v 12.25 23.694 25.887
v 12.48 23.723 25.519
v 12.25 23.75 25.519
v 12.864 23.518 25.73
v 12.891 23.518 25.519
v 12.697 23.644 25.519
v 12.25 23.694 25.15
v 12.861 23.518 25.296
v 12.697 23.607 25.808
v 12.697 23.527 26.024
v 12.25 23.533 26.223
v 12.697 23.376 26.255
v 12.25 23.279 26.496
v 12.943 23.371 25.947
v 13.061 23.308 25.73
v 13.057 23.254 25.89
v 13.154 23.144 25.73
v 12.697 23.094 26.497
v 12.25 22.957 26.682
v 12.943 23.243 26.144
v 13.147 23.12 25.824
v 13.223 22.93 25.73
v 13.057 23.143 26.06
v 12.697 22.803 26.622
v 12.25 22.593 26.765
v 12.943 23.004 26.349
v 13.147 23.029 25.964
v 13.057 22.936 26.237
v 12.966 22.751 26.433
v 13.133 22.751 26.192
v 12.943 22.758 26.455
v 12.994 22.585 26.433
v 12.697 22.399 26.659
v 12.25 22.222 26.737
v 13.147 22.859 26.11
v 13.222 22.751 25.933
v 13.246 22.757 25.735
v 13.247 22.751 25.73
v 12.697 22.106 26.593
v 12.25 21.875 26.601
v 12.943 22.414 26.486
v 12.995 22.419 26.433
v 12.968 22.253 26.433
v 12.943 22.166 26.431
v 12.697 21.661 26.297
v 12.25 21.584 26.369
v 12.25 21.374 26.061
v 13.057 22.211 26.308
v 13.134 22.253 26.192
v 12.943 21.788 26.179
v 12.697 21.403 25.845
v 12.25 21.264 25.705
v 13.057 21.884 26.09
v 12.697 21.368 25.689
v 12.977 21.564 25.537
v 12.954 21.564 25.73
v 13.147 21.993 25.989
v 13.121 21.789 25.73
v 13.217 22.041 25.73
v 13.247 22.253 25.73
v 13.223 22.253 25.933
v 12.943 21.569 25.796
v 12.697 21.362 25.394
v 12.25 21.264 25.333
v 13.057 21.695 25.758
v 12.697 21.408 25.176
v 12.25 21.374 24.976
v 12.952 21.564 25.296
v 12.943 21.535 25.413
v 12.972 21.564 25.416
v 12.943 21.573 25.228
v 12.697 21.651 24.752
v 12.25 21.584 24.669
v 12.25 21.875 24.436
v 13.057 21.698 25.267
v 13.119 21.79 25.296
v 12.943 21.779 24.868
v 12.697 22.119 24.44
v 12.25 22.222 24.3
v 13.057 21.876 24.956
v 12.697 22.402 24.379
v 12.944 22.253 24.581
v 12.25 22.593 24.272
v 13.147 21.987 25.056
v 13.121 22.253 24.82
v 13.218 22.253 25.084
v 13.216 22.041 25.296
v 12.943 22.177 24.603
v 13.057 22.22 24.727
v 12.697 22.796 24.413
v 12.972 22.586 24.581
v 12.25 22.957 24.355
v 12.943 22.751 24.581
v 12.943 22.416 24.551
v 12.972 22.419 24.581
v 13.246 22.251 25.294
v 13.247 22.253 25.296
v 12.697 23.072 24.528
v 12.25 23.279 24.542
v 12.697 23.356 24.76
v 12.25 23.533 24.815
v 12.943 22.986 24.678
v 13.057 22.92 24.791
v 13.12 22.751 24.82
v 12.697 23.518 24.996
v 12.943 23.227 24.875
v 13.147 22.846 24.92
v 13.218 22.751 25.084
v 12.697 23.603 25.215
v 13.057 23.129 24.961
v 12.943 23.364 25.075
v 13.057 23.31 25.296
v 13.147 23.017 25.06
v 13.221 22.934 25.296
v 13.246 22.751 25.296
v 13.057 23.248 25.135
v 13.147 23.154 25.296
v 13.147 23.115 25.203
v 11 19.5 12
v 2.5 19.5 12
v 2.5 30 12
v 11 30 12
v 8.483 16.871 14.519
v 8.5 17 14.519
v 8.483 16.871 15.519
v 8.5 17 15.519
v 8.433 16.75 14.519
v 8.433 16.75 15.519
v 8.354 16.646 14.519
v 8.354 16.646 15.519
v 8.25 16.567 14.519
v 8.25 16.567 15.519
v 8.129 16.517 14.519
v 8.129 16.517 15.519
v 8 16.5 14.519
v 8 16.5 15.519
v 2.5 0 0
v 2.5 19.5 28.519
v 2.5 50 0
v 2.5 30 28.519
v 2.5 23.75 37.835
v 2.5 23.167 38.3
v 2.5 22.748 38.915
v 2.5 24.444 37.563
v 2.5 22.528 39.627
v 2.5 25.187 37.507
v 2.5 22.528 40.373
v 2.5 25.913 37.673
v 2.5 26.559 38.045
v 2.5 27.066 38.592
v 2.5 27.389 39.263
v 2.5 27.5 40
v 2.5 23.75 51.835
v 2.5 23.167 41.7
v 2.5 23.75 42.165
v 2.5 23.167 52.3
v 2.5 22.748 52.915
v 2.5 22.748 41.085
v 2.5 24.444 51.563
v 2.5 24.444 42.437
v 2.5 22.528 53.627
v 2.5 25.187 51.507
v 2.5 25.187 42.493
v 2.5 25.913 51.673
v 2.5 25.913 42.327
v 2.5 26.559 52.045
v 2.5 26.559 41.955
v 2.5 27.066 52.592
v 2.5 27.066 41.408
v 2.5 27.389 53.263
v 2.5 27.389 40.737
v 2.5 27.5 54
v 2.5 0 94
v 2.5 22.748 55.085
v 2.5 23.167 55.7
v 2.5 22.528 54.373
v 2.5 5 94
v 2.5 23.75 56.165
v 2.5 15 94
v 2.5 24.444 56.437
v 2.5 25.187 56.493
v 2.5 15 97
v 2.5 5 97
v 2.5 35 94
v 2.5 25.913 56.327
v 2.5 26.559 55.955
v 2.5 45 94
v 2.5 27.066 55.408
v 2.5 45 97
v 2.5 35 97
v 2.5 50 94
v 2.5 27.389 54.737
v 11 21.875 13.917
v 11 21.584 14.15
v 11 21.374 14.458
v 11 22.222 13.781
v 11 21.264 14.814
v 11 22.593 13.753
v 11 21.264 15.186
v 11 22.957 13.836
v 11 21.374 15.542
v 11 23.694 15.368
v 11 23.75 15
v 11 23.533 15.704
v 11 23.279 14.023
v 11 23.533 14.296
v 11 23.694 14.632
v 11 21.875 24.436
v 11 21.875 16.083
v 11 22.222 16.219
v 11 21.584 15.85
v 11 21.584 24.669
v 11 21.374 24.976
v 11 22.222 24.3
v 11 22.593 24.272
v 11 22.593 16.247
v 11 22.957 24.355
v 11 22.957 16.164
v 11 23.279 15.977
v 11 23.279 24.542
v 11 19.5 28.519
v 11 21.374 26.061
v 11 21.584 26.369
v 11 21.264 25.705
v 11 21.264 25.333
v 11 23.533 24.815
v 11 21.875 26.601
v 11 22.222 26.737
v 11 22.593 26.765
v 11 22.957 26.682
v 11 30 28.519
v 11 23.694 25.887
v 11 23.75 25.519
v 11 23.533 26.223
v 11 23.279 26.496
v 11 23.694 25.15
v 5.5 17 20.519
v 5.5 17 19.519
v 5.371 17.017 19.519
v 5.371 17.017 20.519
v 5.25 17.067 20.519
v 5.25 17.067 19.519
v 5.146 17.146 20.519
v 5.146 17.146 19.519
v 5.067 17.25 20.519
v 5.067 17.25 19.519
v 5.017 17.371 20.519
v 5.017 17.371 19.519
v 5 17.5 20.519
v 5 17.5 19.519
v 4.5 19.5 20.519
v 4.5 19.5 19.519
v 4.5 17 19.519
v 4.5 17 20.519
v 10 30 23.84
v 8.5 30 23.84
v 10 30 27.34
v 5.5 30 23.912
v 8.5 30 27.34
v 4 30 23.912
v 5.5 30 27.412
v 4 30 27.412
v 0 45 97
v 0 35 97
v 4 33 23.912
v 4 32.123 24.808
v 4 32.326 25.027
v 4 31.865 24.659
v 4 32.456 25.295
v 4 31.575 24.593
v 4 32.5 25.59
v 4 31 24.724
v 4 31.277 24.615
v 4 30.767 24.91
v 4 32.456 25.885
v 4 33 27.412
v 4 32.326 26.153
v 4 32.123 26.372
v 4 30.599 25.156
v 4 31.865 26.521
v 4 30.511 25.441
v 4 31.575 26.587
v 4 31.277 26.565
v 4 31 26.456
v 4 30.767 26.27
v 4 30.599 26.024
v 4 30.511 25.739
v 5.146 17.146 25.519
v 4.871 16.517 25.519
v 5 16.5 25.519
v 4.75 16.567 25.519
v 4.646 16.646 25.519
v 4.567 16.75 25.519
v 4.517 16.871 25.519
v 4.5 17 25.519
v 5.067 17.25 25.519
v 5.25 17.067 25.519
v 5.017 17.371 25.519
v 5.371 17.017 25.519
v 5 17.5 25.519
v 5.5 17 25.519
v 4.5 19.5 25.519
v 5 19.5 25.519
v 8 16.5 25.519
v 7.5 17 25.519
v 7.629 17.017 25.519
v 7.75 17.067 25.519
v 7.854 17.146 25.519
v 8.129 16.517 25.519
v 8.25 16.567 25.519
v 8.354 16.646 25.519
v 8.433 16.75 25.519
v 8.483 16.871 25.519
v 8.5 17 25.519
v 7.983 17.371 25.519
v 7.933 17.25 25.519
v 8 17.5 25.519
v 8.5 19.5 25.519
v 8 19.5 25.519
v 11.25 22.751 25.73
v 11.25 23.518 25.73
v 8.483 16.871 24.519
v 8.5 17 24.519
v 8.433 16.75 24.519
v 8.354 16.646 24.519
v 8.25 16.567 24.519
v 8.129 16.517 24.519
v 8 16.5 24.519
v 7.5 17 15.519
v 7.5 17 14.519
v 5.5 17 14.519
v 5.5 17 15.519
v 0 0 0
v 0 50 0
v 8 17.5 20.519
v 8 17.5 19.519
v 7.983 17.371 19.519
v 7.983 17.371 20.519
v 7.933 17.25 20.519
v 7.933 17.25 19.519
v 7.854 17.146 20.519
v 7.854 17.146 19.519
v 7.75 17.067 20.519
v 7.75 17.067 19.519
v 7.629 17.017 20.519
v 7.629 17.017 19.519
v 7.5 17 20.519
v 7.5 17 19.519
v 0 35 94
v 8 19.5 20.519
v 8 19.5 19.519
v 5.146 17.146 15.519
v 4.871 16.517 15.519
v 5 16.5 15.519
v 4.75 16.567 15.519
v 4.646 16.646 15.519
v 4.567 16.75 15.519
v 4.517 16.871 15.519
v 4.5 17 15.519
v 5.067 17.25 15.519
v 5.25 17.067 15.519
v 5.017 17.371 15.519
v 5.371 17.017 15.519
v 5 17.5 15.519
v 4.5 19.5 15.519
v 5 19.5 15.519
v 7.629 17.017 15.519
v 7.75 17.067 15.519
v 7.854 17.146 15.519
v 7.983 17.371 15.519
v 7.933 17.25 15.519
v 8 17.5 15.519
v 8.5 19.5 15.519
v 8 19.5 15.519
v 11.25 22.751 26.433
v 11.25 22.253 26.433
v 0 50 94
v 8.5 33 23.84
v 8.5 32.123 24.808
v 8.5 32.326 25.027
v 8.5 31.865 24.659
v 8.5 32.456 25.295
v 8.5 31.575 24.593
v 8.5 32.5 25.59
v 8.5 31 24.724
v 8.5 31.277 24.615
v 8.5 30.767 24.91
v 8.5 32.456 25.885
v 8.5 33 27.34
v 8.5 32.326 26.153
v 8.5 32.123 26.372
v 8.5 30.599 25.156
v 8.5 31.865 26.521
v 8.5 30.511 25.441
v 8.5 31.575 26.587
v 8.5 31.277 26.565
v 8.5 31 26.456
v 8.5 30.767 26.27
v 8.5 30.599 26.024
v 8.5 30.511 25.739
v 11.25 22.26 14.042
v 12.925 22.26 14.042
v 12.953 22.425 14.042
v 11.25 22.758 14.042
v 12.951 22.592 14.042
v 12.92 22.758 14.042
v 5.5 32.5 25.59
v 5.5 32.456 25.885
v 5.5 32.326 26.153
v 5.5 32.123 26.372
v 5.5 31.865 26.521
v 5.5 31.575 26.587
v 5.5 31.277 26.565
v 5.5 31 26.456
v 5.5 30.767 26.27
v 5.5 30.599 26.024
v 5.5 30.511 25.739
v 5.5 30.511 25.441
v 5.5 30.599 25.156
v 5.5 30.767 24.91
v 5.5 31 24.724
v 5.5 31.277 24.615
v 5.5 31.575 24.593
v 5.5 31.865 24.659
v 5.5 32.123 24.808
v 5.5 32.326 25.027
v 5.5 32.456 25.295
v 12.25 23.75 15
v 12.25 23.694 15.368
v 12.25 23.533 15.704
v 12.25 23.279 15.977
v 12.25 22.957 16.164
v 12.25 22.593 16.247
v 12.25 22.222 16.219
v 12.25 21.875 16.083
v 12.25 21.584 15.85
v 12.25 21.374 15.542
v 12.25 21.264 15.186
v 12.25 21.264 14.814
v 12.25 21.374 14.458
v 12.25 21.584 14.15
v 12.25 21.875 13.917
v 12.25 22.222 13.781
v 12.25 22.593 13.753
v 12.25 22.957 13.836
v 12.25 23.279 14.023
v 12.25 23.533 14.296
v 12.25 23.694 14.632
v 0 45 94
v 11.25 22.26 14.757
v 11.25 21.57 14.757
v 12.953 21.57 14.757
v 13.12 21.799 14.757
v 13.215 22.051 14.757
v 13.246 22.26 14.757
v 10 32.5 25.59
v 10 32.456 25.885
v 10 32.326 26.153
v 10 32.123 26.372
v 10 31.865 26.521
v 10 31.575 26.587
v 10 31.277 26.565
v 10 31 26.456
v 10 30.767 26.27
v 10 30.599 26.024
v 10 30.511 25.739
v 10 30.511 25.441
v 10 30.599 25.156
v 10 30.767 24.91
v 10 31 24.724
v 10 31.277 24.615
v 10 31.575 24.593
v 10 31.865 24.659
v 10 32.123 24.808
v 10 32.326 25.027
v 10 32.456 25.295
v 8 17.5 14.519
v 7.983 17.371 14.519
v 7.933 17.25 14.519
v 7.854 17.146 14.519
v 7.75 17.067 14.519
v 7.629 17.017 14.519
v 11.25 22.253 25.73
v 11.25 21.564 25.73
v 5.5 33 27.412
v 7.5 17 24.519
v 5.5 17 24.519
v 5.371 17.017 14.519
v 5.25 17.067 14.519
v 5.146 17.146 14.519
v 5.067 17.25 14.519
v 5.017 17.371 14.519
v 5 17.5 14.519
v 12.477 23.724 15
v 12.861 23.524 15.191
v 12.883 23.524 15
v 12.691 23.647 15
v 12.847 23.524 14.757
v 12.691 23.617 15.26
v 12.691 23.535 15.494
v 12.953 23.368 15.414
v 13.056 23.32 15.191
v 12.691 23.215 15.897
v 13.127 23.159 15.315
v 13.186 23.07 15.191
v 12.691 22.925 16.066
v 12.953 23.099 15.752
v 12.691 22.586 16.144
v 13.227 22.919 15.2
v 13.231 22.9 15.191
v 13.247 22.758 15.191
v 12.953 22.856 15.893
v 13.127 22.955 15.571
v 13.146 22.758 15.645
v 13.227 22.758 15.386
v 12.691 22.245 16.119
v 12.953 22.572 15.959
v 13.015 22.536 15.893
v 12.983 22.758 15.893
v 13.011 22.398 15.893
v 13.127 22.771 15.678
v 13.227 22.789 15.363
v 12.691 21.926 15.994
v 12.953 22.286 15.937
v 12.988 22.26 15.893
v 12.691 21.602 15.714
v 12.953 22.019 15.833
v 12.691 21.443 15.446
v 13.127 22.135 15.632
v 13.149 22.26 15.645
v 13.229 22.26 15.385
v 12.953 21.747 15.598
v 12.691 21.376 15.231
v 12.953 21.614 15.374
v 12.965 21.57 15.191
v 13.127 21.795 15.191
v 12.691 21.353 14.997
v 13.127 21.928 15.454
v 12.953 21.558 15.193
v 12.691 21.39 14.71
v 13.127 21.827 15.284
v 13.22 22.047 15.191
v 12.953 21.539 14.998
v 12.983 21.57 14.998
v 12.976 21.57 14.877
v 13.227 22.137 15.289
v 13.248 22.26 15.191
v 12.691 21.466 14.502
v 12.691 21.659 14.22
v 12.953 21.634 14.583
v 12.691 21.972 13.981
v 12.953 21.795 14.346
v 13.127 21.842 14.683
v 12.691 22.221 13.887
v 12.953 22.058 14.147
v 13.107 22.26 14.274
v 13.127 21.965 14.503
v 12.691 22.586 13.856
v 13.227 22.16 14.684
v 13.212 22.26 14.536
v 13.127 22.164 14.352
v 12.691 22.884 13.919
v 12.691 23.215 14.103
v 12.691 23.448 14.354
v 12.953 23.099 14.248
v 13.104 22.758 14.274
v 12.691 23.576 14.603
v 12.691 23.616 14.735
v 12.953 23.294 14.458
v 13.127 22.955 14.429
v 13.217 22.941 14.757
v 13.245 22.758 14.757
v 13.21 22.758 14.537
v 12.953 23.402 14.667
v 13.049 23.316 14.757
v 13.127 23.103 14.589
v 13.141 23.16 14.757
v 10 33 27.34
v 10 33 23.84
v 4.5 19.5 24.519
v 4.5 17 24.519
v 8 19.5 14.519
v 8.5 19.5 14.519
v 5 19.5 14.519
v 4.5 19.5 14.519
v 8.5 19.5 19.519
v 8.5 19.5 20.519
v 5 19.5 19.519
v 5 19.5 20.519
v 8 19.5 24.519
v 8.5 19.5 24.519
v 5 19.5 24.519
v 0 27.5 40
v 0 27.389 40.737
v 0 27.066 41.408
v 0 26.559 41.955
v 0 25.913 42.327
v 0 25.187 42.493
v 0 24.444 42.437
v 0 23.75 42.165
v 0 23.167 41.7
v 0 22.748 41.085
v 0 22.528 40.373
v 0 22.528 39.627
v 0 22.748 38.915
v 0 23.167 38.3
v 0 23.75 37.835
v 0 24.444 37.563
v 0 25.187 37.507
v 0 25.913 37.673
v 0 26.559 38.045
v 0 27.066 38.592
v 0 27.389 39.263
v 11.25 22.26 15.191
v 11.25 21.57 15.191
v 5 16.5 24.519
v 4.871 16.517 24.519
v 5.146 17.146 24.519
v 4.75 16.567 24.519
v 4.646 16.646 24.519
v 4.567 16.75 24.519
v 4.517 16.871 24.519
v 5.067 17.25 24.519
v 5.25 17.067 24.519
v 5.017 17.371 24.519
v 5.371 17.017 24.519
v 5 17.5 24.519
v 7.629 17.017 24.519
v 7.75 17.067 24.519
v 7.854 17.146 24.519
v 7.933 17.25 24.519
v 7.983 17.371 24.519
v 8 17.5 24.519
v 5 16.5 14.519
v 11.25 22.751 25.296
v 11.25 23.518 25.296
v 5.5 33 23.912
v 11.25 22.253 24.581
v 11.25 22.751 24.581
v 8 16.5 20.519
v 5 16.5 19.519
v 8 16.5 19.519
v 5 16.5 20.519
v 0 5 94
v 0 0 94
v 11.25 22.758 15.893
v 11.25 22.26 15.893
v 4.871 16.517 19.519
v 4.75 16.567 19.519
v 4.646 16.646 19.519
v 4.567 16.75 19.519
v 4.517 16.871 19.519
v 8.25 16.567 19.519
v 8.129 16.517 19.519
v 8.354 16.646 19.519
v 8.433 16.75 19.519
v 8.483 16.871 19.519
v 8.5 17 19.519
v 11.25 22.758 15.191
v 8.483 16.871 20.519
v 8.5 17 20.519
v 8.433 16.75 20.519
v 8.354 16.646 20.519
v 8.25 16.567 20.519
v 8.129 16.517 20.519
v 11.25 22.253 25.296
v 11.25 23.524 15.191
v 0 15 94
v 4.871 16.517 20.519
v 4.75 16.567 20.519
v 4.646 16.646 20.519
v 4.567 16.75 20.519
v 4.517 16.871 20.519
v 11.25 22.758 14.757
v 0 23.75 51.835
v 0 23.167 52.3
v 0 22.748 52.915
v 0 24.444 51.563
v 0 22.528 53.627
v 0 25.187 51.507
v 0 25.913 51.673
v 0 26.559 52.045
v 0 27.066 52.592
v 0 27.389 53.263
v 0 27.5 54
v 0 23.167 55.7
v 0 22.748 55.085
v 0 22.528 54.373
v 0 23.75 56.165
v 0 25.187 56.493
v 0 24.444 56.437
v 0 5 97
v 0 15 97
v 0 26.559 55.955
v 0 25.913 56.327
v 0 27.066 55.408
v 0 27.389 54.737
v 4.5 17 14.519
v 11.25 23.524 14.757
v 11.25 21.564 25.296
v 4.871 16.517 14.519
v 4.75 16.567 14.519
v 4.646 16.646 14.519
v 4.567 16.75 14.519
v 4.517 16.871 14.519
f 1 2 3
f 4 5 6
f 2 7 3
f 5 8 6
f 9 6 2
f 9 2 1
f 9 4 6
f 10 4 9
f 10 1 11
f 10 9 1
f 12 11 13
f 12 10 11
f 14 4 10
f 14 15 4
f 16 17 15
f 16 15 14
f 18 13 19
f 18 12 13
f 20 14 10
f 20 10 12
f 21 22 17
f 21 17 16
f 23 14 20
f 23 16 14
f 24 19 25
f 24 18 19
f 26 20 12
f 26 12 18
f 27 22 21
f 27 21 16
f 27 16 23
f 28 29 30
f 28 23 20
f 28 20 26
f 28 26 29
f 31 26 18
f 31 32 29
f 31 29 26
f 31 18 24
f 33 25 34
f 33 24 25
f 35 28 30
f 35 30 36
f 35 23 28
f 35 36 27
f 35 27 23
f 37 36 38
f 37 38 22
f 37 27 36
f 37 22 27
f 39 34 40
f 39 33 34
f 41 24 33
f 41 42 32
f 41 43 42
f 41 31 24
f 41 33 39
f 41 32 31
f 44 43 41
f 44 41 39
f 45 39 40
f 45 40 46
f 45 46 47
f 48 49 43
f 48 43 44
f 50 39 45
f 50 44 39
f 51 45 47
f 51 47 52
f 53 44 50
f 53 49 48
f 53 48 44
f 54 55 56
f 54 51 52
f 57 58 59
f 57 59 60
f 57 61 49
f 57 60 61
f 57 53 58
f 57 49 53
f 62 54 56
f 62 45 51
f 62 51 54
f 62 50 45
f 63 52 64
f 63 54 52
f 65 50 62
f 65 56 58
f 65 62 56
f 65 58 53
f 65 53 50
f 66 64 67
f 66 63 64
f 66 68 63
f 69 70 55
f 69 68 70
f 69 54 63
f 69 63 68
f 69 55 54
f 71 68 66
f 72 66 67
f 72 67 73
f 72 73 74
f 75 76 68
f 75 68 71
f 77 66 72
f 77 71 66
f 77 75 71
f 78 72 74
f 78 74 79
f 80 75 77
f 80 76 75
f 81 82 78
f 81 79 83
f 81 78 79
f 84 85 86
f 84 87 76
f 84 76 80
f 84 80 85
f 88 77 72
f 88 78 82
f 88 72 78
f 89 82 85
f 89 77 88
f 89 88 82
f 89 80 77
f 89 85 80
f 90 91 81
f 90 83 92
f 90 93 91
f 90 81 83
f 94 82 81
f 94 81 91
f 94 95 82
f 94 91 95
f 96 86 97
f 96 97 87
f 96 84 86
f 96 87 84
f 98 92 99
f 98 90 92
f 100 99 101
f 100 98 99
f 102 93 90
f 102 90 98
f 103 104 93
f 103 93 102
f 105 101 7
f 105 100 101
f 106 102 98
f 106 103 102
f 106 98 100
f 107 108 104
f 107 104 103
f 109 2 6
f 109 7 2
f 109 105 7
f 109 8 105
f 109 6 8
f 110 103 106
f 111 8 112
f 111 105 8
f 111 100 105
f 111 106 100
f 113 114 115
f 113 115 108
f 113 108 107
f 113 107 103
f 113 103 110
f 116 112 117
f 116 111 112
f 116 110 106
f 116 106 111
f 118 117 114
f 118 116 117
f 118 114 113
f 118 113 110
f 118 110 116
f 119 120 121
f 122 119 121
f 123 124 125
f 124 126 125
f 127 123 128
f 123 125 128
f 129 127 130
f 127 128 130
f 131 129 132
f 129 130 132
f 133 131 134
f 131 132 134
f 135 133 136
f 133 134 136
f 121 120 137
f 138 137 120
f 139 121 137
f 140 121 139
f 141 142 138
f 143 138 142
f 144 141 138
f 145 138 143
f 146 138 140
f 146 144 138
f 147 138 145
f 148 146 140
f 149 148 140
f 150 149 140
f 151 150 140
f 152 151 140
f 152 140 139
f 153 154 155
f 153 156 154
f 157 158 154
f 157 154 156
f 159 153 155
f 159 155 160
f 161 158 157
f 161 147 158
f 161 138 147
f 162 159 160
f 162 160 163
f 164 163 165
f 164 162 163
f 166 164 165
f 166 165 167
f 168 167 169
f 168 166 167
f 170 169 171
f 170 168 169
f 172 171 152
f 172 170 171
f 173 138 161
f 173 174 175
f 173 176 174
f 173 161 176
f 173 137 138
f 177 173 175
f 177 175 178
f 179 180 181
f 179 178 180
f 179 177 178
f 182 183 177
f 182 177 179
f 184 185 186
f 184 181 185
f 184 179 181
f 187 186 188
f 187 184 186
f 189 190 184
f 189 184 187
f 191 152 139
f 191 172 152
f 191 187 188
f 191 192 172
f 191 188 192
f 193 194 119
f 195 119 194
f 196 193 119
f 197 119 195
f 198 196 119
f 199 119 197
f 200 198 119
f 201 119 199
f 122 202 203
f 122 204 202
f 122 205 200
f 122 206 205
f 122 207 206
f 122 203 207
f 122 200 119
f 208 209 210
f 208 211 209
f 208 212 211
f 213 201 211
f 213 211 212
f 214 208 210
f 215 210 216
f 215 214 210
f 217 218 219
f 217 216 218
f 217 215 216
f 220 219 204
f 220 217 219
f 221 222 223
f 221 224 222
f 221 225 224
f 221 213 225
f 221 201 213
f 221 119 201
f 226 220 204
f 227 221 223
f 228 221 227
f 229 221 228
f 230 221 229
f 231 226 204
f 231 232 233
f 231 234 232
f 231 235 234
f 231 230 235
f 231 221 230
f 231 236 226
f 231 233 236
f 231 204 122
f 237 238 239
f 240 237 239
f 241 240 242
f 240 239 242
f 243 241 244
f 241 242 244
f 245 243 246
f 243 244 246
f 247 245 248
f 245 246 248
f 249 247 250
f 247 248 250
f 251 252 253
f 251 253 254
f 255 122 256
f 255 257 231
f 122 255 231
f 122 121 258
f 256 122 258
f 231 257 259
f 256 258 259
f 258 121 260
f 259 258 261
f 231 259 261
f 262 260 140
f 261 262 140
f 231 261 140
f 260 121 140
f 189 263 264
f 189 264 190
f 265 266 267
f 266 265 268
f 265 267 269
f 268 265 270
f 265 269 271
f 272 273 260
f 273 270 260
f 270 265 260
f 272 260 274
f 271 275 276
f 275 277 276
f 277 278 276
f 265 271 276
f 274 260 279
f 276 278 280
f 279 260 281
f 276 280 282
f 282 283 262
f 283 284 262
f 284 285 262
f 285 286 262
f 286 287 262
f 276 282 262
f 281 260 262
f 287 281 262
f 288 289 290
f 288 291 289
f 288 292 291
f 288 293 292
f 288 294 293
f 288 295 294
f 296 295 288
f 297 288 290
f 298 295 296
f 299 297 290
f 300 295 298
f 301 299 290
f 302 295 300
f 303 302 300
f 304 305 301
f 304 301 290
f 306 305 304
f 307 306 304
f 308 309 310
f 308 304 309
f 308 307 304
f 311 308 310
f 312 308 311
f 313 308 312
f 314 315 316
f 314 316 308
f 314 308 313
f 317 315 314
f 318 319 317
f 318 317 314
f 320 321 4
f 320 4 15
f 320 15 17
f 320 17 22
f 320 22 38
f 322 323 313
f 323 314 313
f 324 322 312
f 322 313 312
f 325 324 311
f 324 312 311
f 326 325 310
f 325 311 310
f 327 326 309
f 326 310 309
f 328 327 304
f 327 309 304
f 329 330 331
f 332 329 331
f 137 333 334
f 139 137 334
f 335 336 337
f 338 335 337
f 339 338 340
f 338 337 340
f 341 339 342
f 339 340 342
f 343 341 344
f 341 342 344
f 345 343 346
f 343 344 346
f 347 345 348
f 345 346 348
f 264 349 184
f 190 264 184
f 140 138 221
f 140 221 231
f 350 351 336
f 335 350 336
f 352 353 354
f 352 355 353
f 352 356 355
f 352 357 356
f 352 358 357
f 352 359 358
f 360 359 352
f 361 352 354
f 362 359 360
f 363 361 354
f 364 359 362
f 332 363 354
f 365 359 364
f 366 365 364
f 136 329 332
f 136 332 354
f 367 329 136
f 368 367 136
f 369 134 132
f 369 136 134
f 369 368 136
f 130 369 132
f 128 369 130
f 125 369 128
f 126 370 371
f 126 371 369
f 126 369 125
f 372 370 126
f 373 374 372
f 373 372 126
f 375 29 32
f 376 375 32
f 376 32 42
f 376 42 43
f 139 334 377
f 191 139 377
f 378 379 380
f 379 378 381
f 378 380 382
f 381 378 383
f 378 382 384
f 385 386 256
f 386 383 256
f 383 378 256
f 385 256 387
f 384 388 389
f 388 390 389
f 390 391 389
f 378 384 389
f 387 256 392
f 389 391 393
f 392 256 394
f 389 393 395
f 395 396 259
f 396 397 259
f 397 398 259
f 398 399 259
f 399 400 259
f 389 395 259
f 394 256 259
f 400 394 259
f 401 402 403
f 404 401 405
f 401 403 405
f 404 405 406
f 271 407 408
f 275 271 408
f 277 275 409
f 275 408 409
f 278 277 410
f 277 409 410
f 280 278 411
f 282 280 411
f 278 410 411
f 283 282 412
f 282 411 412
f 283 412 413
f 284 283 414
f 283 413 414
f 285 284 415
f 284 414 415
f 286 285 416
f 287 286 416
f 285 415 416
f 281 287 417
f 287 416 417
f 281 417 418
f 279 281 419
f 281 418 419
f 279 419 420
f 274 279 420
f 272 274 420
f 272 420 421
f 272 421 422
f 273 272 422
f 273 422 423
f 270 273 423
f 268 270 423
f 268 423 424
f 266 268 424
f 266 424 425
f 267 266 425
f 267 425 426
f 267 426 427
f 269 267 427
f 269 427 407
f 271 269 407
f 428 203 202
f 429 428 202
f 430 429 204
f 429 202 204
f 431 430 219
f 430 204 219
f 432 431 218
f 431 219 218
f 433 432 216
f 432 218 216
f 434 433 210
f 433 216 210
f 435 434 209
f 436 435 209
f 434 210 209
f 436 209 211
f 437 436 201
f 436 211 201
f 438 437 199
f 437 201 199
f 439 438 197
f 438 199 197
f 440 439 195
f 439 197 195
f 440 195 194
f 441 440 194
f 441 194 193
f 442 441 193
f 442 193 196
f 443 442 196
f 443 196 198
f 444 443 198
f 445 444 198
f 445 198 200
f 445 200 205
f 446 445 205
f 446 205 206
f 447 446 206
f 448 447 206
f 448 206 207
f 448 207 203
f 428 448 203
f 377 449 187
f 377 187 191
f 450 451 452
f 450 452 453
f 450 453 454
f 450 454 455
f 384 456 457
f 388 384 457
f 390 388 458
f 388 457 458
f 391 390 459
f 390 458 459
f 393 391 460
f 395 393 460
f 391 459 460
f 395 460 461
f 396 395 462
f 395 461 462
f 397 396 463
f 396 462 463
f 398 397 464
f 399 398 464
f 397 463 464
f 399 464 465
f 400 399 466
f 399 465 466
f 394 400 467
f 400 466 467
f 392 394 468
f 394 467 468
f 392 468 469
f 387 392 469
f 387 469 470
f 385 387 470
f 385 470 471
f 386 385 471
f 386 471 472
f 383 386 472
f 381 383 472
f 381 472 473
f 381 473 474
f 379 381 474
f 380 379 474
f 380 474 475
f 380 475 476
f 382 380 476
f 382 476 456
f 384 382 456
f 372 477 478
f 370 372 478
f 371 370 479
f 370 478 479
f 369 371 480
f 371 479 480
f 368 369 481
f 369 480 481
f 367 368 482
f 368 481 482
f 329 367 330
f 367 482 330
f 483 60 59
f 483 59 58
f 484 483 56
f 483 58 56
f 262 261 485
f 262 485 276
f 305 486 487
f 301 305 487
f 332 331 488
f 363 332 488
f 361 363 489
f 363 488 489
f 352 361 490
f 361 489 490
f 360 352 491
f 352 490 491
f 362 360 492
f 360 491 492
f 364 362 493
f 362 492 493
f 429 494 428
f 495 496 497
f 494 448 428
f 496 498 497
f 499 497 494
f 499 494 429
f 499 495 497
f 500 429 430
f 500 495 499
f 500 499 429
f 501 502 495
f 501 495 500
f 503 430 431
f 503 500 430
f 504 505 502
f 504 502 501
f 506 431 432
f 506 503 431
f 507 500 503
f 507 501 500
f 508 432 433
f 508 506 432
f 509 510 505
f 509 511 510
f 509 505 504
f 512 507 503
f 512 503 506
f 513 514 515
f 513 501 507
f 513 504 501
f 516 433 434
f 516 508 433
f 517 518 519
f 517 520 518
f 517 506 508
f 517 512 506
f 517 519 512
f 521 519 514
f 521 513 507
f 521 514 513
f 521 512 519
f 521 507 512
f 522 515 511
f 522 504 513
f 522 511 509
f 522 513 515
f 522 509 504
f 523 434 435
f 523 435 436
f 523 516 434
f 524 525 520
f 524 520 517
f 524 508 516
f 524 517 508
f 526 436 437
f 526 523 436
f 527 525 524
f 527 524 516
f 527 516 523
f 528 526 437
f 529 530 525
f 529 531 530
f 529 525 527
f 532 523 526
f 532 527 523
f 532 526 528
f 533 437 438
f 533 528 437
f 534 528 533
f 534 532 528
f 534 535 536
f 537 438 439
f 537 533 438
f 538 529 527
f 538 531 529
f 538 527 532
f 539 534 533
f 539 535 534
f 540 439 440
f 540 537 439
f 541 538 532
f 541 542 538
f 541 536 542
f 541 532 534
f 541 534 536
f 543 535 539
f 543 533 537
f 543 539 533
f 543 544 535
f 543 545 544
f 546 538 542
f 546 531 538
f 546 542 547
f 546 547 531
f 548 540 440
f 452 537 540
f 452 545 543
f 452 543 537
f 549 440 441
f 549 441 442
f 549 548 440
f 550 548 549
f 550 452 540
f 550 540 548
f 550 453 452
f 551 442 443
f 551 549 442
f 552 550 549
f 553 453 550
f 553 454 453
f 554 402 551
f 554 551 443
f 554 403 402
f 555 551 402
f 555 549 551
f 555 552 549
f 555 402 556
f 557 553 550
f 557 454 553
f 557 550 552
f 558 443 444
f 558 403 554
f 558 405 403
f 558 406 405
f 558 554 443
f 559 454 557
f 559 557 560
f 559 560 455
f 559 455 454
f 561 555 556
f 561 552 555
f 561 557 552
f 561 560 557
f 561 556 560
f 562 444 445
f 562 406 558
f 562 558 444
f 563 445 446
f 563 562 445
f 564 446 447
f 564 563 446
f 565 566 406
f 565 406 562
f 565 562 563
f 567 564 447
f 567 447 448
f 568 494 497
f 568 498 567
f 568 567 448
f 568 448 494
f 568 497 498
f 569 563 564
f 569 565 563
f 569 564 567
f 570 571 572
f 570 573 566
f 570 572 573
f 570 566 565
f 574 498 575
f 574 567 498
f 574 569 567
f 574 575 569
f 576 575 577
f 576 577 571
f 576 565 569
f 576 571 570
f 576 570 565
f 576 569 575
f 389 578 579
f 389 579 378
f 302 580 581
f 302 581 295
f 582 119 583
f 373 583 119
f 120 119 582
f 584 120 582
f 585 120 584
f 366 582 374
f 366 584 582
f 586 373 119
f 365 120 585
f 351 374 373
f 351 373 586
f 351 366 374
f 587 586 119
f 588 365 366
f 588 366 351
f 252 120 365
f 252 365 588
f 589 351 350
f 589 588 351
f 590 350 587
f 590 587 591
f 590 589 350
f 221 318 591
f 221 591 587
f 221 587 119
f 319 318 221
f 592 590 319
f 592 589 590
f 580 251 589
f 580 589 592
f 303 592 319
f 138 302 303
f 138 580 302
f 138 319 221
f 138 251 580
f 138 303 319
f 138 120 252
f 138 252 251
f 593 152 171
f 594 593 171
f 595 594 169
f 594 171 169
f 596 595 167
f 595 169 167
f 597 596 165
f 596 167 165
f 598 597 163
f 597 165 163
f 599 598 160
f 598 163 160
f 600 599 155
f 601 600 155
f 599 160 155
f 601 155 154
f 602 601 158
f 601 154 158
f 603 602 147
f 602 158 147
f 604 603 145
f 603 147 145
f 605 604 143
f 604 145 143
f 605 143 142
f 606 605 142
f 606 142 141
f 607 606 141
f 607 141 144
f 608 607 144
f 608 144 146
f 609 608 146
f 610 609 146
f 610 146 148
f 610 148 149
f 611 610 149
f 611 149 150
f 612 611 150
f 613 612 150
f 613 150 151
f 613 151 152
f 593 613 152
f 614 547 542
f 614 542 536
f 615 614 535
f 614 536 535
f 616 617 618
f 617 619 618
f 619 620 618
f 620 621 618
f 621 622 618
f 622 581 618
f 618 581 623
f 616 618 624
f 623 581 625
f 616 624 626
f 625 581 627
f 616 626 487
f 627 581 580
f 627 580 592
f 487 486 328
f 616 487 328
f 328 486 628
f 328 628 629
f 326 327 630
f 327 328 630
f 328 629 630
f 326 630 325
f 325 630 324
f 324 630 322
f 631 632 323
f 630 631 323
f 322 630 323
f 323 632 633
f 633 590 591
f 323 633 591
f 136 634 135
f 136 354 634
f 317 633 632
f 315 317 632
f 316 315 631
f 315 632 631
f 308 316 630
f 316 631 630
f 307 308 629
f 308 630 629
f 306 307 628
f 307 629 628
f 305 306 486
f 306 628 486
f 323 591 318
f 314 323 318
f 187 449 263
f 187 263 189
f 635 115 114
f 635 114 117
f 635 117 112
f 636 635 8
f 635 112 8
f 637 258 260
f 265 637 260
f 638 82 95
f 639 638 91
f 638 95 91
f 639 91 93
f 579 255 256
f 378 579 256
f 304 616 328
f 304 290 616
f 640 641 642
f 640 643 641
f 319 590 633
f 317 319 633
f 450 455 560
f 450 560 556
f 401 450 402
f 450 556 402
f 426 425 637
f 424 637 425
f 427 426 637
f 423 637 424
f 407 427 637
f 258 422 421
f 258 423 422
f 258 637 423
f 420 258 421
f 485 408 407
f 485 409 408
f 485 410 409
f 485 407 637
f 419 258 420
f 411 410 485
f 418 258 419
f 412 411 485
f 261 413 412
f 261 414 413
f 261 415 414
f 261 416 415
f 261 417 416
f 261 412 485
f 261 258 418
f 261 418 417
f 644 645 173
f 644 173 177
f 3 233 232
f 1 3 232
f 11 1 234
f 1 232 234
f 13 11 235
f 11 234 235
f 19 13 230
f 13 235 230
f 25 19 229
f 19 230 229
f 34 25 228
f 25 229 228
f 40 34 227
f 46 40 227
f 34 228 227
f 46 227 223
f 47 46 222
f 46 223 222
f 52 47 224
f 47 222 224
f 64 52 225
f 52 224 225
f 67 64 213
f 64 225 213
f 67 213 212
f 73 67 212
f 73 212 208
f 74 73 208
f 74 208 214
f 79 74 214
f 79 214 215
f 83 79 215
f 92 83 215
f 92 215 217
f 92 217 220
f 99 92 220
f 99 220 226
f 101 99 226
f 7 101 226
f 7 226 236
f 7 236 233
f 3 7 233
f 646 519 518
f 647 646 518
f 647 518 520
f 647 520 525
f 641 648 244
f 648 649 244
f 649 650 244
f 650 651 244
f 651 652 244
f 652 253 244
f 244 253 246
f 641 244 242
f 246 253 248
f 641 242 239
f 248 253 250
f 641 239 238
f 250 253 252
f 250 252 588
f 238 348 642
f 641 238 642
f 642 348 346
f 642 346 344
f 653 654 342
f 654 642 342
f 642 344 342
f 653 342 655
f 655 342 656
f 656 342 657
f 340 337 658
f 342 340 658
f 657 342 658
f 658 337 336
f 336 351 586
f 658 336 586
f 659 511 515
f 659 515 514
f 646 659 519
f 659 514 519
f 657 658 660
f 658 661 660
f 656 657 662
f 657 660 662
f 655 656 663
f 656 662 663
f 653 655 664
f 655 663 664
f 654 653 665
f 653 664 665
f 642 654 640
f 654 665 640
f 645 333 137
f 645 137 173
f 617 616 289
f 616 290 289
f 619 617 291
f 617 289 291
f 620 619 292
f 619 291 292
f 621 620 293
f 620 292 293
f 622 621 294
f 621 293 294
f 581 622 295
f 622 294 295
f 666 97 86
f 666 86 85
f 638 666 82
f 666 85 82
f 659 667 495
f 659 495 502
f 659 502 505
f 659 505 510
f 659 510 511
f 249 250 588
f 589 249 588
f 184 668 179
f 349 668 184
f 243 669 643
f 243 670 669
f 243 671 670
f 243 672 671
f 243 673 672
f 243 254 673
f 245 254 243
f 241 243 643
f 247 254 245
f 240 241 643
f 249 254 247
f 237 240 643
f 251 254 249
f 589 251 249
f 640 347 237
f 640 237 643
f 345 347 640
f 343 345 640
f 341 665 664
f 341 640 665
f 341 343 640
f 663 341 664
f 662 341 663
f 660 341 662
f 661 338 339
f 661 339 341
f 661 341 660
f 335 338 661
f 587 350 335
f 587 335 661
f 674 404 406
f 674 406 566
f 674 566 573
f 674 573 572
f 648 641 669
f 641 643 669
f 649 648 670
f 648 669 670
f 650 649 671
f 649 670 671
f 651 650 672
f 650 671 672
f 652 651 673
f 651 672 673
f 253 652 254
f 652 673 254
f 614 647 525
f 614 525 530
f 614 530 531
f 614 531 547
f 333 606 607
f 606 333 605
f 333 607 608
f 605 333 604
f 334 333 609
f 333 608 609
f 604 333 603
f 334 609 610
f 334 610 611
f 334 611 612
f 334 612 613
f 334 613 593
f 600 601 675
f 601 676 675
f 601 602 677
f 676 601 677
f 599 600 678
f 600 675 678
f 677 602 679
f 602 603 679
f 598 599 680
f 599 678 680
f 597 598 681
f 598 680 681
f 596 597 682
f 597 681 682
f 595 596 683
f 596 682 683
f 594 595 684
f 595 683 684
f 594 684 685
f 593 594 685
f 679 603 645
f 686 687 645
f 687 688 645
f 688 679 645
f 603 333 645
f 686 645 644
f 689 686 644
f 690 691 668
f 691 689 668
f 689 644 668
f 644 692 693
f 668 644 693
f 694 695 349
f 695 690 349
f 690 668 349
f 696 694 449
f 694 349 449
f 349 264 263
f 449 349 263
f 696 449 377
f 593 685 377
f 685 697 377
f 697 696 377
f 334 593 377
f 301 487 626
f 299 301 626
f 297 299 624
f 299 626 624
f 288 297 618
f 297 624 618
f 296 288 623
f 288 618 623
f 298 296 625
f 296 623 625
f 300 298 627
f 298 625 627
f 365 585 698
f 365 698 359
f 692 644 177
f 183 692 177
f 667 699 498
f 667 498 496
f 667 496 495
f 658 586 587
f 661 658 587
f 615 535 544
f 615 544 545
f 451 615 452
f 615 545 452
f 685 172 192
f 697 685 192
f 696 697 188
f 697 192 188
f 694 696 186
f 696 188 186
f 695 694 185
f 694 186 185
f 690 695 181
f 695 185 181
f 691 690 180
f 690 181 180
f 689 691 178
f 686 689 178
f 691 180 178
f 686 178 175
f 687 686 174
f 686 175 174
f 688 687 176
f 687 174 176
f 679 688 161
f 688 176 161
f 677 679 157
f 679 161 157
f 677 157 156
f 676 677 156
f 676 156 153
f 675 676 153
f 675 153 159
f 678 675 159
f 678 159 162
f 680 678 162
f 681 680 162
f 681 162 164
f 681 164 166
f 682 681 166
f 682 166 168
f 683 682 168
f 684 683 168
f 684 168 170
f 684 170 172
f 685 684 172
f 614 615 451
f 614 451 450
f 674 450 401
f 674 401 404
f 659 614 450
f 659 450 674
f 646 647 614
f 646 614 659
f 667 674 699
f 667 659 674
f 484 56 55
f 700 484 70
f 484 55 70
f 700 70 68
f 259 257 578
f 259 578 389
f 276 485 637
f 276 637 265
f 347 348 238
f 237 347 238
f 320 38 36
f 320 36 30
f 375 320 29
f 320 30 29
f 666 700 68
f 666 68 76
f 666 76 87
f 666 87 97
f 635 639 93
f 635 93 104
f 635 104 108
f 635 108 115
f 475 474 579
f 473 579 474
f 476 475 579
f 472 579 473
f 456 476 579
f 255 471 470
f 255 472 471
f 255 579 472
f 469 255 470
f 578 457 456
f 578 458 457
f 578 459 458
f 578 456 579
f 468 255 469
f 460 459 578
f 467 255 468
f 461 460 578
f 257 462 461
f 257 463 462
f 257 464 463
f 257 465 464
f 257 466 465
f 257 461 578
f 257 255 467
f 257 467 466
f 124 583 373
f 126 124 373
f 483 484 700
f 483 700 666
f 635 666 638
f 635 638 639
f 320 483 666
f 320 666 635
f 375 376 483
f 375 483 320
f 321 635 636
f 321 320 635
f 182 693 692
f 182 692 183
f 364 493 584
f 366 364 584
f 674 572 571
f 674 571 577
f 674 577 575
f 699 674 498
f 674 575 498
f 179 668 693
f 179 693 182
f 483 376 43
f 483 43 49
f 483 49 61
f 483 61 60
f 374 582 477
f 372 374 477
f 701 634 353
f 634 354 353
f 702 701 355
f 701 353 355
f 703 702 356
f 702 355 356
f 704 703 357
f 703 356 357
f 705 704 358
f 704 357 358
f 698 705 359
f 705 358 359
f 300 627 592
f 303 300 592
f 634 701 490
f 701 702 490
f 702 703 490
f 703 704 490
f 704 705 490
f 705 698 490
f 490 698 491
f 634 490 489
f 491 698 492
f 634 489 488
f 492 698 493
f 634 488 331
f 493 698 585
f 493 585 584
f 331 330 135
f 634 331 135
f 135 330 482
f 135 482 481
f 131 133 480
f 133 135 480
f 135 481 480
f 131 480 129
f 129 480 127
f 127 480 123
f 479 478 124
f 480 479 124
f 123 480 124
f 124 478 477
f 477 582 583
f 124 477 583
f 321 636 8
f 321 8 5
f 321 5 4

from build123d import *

# Parameters (mm, degrees)
F0_W      = 50
F0_H      = 94
F1_DEPTH  = 2.5
F2_W      = 2.5
F2_H      = 10
F3_DEPTH  = 3
F4_R      = 2.5
F5_DEPTH  = 25
F6_W      = 10.5
F6_H      = 16.5188284865
F7_DEPTH  = 8.5
F8_W      = 4
F8_H      = 1
F9_DEPTH  = 3
F11_DEPTH = 82.4821715135
F12_R     = 0.5
F13_R     = 1.25
F14_DEPTH = 2.25
F16_DEPTH = 2
F18_W     = 1.5
F18_H     = 3.5
F19_DEPTH = 3
F20_R     = 1
F21_DEPTH = 6


# Not quite as in the source:
# - a fillet or chamfer that OpenCascade refuses, or shapes differently, is made with other operations: its cross-section is extruded or revolved along the edge and cut away or added


with BuildPart() as f1:
    # F0 (on Right) → F1 (new body)
    with BuildSketch(Plane.YZ):
        with Locations((25, 47)):
            Rectangle(F0_W, F0_H)
    extrude(amount=F1_DEPTH)

    # F2 (on face) → F3 (join)
    with BuildSketch(Plane.XY.offset(94)):
        with Locations((1.25, 40)):
            Rectangle(F2_W, F2_H)
        with Locations((1.25, 10)):
            Rectangle(F2_W, F2_H)
    extrude(amount=F3_DEPTH)

    # F4 (on face) → F5 (cut)
    with BuildSketch(Plane.YZ.offset(2.5)):
        with Locations((25, 40)):
            Circle(F4_R)
        with Locations((25, 54)):
            Circle(F4_R)
    extrude(amount=-F5_DEPTH, mode=Mode.SUBTRACT)

    # F6 (on face) → F7 (join)
    with BuildSketch(Plane.YZ.offset(2.5)):
        with Locations((24.75, 20.2594142432)):
            Rectangle(F6_W, F6_H)
    extrude(amount=F7_DEPTH)

    # F8 (on face) → F9 (join)
    with BuildSketch(Plane.XZ.offset(-19.5)):
        with Locations((6.5, 25.0188284865)):
            Rectangle(F8_W, F8_H)
        with Locations((6.5, 20.0188284865)):
            Rectangle(F8_W, F8_H)
        with Locations((6.5, 15.0188284865)):
            Rectangle(F8_W, F8_H)
    extrude(amount=F9_DEPTH)

    # F10 (on face) → F11 (cut, through all)
    with BuildSketch(Plane(origin=(0, 0, 14.5188284865), x_dir=(1, 0, 0), z_dir=(0, 0, -1))):
        with BuildLine():
            Line((5, -17.5), (5, -19.5))
            Line((5, -19.5), (8, -19.5))
            Line((8, -19.5), (8, -17.5))
            ThreePointArc((8, -17.5), (7.8535533906, -17.1464466094), (7.5, -17))
            Line((7.5, -17), (5.5, -17))
            ThreePointArc((5.5, -17), (5.1464466094, -17.1464466094), (5, -17.5))
        make_face()
    extrude(amount=-F11_DEPTH, mode=Mode.SUBTRACT)

    # F12
    f12_edges = [f1.edges().sort_by_distance(p)[0] for p in [
        (8.5, 16.5, 15.018828),
        (8.5, 16.5, 20.018828),
        (8.5, 16.5, 25.018828),
        (4.5, 16.5, 25.018828),
        (4.5, 16.5, 20.018828),
        (4.5, 16.5, 15.018828),
    ]]
    fillet(f12_edges, radius=F12_R)

    # F13 (on face) → F14 (join)
    with BuildSketch(Plane.YZ.offset(11)):
        with Locations((22.5, 25.5188284865)):
            Circle(F13_R)
        with Locations((22.5, 15)):
            Circle(F13_R)
    extrude(amount=F14_DEPTH)

    # F15 (on face) → F16 (cut)
    with BuildSketch(Plane.YZ.offset(13.25)):
        Polygon((22.2532600164, 25.2959672362), (22.2532600164, 24.5808176696), (22.7513108402, 24.5808176696), (22.7513108402, 25.2959672362), (23.51754345, 25.2959672362), (23.51754345, 25.7301647216), (22.7513108402, 25.7301647216), (22.7513108402, 26.4325458556), (22.2532600164, 26.4325458556), (22.2532600164, 25.7301647216), (21.5636510402, 25.7301647216), (21.5636510402, 25.2959672362), align=None)
        Polygon((22.2596314482, 14.7567068819), (22.2596314482, 14.0415573154), (22.757682272, 14.0415573154), (22.757682272, 14.7567068819), (23.5239148817, 14.7567068819), (23.5239148817, 15.1909043674), (22.757682272, 15.1909043674), (22.757682272, 15.8932855014), (22.2596314482, 15.8932855014), (22.2596314482, 15.1909043674), (21.5700224719, 15.1909043674), (21.5700224719, 14.7567068819), align=None)
    extrude(amount=-F16_DEPTH, mode=Mode.SUBTRACT)

    # F17: fillet of radius 1 on 2 edges, made by hand

    # F17_s1 → F17_t2 (revolve, cut)
    with BuildSketch(Plane.XY.offset(25.5188284865)):
        with BuildLine():
            ThreePointArc((12.25, 23.75), (12.9571067812, 23.4571067812), (13.25, 22.75))
            Line((13.25, 22.75), (13.25, 23.75))
            Line((13.25, 23.75), (12.25, 23.75))
        make_face()
    revolve(axis=Axis((13.25, 22.5, 25.5188284865), (1, 0, 0)), mode=Mode.SUBTRACT)

    # F17_s3 → F17_t4 (revolve, cut)
    with BuildSketch(Plane.XY.offset(15)):
        with BuildLine():
            ThreePointArc((12.25, 23.75), (12.9571067812, 23.4571067812), (13.25, 22.75))
            Line((13.25, 22.75), (13.25, 23.75))
            Line((13.25, 23.75), (12.25, 23.75))
        make_face()
    revolve(axis=Axis((13.25, 22.5, 15), (1, 0, 0)), mode=Mode.SUBTRACT)

    # F18 (on face) → F19 (join)
    with BuildSketch(Plane(origin=(0, 30, 0), x_dir=(-1, 0, 0), z_dir=(0, 1, 0))):
        with Locations((-9.25, 25.5901701748)):
            Rectangle(F18_W, F18_H)
        with Locations((-4.75, 25.6615988507)):
            Rectangle(F18_W, F18_H)
    extrude(amount=F19_DEPTH)

    # F20 (on face) → F21 (cut)
    with BuildSketch(Plane.YZ.offset(10)):
        with Locations((31.5, 25.5901701748)):
            Circle(F20_R)
    extrude(amount=-F21_DEPTH, mode=Mode.SUBTRACT)


solid = f1.part
